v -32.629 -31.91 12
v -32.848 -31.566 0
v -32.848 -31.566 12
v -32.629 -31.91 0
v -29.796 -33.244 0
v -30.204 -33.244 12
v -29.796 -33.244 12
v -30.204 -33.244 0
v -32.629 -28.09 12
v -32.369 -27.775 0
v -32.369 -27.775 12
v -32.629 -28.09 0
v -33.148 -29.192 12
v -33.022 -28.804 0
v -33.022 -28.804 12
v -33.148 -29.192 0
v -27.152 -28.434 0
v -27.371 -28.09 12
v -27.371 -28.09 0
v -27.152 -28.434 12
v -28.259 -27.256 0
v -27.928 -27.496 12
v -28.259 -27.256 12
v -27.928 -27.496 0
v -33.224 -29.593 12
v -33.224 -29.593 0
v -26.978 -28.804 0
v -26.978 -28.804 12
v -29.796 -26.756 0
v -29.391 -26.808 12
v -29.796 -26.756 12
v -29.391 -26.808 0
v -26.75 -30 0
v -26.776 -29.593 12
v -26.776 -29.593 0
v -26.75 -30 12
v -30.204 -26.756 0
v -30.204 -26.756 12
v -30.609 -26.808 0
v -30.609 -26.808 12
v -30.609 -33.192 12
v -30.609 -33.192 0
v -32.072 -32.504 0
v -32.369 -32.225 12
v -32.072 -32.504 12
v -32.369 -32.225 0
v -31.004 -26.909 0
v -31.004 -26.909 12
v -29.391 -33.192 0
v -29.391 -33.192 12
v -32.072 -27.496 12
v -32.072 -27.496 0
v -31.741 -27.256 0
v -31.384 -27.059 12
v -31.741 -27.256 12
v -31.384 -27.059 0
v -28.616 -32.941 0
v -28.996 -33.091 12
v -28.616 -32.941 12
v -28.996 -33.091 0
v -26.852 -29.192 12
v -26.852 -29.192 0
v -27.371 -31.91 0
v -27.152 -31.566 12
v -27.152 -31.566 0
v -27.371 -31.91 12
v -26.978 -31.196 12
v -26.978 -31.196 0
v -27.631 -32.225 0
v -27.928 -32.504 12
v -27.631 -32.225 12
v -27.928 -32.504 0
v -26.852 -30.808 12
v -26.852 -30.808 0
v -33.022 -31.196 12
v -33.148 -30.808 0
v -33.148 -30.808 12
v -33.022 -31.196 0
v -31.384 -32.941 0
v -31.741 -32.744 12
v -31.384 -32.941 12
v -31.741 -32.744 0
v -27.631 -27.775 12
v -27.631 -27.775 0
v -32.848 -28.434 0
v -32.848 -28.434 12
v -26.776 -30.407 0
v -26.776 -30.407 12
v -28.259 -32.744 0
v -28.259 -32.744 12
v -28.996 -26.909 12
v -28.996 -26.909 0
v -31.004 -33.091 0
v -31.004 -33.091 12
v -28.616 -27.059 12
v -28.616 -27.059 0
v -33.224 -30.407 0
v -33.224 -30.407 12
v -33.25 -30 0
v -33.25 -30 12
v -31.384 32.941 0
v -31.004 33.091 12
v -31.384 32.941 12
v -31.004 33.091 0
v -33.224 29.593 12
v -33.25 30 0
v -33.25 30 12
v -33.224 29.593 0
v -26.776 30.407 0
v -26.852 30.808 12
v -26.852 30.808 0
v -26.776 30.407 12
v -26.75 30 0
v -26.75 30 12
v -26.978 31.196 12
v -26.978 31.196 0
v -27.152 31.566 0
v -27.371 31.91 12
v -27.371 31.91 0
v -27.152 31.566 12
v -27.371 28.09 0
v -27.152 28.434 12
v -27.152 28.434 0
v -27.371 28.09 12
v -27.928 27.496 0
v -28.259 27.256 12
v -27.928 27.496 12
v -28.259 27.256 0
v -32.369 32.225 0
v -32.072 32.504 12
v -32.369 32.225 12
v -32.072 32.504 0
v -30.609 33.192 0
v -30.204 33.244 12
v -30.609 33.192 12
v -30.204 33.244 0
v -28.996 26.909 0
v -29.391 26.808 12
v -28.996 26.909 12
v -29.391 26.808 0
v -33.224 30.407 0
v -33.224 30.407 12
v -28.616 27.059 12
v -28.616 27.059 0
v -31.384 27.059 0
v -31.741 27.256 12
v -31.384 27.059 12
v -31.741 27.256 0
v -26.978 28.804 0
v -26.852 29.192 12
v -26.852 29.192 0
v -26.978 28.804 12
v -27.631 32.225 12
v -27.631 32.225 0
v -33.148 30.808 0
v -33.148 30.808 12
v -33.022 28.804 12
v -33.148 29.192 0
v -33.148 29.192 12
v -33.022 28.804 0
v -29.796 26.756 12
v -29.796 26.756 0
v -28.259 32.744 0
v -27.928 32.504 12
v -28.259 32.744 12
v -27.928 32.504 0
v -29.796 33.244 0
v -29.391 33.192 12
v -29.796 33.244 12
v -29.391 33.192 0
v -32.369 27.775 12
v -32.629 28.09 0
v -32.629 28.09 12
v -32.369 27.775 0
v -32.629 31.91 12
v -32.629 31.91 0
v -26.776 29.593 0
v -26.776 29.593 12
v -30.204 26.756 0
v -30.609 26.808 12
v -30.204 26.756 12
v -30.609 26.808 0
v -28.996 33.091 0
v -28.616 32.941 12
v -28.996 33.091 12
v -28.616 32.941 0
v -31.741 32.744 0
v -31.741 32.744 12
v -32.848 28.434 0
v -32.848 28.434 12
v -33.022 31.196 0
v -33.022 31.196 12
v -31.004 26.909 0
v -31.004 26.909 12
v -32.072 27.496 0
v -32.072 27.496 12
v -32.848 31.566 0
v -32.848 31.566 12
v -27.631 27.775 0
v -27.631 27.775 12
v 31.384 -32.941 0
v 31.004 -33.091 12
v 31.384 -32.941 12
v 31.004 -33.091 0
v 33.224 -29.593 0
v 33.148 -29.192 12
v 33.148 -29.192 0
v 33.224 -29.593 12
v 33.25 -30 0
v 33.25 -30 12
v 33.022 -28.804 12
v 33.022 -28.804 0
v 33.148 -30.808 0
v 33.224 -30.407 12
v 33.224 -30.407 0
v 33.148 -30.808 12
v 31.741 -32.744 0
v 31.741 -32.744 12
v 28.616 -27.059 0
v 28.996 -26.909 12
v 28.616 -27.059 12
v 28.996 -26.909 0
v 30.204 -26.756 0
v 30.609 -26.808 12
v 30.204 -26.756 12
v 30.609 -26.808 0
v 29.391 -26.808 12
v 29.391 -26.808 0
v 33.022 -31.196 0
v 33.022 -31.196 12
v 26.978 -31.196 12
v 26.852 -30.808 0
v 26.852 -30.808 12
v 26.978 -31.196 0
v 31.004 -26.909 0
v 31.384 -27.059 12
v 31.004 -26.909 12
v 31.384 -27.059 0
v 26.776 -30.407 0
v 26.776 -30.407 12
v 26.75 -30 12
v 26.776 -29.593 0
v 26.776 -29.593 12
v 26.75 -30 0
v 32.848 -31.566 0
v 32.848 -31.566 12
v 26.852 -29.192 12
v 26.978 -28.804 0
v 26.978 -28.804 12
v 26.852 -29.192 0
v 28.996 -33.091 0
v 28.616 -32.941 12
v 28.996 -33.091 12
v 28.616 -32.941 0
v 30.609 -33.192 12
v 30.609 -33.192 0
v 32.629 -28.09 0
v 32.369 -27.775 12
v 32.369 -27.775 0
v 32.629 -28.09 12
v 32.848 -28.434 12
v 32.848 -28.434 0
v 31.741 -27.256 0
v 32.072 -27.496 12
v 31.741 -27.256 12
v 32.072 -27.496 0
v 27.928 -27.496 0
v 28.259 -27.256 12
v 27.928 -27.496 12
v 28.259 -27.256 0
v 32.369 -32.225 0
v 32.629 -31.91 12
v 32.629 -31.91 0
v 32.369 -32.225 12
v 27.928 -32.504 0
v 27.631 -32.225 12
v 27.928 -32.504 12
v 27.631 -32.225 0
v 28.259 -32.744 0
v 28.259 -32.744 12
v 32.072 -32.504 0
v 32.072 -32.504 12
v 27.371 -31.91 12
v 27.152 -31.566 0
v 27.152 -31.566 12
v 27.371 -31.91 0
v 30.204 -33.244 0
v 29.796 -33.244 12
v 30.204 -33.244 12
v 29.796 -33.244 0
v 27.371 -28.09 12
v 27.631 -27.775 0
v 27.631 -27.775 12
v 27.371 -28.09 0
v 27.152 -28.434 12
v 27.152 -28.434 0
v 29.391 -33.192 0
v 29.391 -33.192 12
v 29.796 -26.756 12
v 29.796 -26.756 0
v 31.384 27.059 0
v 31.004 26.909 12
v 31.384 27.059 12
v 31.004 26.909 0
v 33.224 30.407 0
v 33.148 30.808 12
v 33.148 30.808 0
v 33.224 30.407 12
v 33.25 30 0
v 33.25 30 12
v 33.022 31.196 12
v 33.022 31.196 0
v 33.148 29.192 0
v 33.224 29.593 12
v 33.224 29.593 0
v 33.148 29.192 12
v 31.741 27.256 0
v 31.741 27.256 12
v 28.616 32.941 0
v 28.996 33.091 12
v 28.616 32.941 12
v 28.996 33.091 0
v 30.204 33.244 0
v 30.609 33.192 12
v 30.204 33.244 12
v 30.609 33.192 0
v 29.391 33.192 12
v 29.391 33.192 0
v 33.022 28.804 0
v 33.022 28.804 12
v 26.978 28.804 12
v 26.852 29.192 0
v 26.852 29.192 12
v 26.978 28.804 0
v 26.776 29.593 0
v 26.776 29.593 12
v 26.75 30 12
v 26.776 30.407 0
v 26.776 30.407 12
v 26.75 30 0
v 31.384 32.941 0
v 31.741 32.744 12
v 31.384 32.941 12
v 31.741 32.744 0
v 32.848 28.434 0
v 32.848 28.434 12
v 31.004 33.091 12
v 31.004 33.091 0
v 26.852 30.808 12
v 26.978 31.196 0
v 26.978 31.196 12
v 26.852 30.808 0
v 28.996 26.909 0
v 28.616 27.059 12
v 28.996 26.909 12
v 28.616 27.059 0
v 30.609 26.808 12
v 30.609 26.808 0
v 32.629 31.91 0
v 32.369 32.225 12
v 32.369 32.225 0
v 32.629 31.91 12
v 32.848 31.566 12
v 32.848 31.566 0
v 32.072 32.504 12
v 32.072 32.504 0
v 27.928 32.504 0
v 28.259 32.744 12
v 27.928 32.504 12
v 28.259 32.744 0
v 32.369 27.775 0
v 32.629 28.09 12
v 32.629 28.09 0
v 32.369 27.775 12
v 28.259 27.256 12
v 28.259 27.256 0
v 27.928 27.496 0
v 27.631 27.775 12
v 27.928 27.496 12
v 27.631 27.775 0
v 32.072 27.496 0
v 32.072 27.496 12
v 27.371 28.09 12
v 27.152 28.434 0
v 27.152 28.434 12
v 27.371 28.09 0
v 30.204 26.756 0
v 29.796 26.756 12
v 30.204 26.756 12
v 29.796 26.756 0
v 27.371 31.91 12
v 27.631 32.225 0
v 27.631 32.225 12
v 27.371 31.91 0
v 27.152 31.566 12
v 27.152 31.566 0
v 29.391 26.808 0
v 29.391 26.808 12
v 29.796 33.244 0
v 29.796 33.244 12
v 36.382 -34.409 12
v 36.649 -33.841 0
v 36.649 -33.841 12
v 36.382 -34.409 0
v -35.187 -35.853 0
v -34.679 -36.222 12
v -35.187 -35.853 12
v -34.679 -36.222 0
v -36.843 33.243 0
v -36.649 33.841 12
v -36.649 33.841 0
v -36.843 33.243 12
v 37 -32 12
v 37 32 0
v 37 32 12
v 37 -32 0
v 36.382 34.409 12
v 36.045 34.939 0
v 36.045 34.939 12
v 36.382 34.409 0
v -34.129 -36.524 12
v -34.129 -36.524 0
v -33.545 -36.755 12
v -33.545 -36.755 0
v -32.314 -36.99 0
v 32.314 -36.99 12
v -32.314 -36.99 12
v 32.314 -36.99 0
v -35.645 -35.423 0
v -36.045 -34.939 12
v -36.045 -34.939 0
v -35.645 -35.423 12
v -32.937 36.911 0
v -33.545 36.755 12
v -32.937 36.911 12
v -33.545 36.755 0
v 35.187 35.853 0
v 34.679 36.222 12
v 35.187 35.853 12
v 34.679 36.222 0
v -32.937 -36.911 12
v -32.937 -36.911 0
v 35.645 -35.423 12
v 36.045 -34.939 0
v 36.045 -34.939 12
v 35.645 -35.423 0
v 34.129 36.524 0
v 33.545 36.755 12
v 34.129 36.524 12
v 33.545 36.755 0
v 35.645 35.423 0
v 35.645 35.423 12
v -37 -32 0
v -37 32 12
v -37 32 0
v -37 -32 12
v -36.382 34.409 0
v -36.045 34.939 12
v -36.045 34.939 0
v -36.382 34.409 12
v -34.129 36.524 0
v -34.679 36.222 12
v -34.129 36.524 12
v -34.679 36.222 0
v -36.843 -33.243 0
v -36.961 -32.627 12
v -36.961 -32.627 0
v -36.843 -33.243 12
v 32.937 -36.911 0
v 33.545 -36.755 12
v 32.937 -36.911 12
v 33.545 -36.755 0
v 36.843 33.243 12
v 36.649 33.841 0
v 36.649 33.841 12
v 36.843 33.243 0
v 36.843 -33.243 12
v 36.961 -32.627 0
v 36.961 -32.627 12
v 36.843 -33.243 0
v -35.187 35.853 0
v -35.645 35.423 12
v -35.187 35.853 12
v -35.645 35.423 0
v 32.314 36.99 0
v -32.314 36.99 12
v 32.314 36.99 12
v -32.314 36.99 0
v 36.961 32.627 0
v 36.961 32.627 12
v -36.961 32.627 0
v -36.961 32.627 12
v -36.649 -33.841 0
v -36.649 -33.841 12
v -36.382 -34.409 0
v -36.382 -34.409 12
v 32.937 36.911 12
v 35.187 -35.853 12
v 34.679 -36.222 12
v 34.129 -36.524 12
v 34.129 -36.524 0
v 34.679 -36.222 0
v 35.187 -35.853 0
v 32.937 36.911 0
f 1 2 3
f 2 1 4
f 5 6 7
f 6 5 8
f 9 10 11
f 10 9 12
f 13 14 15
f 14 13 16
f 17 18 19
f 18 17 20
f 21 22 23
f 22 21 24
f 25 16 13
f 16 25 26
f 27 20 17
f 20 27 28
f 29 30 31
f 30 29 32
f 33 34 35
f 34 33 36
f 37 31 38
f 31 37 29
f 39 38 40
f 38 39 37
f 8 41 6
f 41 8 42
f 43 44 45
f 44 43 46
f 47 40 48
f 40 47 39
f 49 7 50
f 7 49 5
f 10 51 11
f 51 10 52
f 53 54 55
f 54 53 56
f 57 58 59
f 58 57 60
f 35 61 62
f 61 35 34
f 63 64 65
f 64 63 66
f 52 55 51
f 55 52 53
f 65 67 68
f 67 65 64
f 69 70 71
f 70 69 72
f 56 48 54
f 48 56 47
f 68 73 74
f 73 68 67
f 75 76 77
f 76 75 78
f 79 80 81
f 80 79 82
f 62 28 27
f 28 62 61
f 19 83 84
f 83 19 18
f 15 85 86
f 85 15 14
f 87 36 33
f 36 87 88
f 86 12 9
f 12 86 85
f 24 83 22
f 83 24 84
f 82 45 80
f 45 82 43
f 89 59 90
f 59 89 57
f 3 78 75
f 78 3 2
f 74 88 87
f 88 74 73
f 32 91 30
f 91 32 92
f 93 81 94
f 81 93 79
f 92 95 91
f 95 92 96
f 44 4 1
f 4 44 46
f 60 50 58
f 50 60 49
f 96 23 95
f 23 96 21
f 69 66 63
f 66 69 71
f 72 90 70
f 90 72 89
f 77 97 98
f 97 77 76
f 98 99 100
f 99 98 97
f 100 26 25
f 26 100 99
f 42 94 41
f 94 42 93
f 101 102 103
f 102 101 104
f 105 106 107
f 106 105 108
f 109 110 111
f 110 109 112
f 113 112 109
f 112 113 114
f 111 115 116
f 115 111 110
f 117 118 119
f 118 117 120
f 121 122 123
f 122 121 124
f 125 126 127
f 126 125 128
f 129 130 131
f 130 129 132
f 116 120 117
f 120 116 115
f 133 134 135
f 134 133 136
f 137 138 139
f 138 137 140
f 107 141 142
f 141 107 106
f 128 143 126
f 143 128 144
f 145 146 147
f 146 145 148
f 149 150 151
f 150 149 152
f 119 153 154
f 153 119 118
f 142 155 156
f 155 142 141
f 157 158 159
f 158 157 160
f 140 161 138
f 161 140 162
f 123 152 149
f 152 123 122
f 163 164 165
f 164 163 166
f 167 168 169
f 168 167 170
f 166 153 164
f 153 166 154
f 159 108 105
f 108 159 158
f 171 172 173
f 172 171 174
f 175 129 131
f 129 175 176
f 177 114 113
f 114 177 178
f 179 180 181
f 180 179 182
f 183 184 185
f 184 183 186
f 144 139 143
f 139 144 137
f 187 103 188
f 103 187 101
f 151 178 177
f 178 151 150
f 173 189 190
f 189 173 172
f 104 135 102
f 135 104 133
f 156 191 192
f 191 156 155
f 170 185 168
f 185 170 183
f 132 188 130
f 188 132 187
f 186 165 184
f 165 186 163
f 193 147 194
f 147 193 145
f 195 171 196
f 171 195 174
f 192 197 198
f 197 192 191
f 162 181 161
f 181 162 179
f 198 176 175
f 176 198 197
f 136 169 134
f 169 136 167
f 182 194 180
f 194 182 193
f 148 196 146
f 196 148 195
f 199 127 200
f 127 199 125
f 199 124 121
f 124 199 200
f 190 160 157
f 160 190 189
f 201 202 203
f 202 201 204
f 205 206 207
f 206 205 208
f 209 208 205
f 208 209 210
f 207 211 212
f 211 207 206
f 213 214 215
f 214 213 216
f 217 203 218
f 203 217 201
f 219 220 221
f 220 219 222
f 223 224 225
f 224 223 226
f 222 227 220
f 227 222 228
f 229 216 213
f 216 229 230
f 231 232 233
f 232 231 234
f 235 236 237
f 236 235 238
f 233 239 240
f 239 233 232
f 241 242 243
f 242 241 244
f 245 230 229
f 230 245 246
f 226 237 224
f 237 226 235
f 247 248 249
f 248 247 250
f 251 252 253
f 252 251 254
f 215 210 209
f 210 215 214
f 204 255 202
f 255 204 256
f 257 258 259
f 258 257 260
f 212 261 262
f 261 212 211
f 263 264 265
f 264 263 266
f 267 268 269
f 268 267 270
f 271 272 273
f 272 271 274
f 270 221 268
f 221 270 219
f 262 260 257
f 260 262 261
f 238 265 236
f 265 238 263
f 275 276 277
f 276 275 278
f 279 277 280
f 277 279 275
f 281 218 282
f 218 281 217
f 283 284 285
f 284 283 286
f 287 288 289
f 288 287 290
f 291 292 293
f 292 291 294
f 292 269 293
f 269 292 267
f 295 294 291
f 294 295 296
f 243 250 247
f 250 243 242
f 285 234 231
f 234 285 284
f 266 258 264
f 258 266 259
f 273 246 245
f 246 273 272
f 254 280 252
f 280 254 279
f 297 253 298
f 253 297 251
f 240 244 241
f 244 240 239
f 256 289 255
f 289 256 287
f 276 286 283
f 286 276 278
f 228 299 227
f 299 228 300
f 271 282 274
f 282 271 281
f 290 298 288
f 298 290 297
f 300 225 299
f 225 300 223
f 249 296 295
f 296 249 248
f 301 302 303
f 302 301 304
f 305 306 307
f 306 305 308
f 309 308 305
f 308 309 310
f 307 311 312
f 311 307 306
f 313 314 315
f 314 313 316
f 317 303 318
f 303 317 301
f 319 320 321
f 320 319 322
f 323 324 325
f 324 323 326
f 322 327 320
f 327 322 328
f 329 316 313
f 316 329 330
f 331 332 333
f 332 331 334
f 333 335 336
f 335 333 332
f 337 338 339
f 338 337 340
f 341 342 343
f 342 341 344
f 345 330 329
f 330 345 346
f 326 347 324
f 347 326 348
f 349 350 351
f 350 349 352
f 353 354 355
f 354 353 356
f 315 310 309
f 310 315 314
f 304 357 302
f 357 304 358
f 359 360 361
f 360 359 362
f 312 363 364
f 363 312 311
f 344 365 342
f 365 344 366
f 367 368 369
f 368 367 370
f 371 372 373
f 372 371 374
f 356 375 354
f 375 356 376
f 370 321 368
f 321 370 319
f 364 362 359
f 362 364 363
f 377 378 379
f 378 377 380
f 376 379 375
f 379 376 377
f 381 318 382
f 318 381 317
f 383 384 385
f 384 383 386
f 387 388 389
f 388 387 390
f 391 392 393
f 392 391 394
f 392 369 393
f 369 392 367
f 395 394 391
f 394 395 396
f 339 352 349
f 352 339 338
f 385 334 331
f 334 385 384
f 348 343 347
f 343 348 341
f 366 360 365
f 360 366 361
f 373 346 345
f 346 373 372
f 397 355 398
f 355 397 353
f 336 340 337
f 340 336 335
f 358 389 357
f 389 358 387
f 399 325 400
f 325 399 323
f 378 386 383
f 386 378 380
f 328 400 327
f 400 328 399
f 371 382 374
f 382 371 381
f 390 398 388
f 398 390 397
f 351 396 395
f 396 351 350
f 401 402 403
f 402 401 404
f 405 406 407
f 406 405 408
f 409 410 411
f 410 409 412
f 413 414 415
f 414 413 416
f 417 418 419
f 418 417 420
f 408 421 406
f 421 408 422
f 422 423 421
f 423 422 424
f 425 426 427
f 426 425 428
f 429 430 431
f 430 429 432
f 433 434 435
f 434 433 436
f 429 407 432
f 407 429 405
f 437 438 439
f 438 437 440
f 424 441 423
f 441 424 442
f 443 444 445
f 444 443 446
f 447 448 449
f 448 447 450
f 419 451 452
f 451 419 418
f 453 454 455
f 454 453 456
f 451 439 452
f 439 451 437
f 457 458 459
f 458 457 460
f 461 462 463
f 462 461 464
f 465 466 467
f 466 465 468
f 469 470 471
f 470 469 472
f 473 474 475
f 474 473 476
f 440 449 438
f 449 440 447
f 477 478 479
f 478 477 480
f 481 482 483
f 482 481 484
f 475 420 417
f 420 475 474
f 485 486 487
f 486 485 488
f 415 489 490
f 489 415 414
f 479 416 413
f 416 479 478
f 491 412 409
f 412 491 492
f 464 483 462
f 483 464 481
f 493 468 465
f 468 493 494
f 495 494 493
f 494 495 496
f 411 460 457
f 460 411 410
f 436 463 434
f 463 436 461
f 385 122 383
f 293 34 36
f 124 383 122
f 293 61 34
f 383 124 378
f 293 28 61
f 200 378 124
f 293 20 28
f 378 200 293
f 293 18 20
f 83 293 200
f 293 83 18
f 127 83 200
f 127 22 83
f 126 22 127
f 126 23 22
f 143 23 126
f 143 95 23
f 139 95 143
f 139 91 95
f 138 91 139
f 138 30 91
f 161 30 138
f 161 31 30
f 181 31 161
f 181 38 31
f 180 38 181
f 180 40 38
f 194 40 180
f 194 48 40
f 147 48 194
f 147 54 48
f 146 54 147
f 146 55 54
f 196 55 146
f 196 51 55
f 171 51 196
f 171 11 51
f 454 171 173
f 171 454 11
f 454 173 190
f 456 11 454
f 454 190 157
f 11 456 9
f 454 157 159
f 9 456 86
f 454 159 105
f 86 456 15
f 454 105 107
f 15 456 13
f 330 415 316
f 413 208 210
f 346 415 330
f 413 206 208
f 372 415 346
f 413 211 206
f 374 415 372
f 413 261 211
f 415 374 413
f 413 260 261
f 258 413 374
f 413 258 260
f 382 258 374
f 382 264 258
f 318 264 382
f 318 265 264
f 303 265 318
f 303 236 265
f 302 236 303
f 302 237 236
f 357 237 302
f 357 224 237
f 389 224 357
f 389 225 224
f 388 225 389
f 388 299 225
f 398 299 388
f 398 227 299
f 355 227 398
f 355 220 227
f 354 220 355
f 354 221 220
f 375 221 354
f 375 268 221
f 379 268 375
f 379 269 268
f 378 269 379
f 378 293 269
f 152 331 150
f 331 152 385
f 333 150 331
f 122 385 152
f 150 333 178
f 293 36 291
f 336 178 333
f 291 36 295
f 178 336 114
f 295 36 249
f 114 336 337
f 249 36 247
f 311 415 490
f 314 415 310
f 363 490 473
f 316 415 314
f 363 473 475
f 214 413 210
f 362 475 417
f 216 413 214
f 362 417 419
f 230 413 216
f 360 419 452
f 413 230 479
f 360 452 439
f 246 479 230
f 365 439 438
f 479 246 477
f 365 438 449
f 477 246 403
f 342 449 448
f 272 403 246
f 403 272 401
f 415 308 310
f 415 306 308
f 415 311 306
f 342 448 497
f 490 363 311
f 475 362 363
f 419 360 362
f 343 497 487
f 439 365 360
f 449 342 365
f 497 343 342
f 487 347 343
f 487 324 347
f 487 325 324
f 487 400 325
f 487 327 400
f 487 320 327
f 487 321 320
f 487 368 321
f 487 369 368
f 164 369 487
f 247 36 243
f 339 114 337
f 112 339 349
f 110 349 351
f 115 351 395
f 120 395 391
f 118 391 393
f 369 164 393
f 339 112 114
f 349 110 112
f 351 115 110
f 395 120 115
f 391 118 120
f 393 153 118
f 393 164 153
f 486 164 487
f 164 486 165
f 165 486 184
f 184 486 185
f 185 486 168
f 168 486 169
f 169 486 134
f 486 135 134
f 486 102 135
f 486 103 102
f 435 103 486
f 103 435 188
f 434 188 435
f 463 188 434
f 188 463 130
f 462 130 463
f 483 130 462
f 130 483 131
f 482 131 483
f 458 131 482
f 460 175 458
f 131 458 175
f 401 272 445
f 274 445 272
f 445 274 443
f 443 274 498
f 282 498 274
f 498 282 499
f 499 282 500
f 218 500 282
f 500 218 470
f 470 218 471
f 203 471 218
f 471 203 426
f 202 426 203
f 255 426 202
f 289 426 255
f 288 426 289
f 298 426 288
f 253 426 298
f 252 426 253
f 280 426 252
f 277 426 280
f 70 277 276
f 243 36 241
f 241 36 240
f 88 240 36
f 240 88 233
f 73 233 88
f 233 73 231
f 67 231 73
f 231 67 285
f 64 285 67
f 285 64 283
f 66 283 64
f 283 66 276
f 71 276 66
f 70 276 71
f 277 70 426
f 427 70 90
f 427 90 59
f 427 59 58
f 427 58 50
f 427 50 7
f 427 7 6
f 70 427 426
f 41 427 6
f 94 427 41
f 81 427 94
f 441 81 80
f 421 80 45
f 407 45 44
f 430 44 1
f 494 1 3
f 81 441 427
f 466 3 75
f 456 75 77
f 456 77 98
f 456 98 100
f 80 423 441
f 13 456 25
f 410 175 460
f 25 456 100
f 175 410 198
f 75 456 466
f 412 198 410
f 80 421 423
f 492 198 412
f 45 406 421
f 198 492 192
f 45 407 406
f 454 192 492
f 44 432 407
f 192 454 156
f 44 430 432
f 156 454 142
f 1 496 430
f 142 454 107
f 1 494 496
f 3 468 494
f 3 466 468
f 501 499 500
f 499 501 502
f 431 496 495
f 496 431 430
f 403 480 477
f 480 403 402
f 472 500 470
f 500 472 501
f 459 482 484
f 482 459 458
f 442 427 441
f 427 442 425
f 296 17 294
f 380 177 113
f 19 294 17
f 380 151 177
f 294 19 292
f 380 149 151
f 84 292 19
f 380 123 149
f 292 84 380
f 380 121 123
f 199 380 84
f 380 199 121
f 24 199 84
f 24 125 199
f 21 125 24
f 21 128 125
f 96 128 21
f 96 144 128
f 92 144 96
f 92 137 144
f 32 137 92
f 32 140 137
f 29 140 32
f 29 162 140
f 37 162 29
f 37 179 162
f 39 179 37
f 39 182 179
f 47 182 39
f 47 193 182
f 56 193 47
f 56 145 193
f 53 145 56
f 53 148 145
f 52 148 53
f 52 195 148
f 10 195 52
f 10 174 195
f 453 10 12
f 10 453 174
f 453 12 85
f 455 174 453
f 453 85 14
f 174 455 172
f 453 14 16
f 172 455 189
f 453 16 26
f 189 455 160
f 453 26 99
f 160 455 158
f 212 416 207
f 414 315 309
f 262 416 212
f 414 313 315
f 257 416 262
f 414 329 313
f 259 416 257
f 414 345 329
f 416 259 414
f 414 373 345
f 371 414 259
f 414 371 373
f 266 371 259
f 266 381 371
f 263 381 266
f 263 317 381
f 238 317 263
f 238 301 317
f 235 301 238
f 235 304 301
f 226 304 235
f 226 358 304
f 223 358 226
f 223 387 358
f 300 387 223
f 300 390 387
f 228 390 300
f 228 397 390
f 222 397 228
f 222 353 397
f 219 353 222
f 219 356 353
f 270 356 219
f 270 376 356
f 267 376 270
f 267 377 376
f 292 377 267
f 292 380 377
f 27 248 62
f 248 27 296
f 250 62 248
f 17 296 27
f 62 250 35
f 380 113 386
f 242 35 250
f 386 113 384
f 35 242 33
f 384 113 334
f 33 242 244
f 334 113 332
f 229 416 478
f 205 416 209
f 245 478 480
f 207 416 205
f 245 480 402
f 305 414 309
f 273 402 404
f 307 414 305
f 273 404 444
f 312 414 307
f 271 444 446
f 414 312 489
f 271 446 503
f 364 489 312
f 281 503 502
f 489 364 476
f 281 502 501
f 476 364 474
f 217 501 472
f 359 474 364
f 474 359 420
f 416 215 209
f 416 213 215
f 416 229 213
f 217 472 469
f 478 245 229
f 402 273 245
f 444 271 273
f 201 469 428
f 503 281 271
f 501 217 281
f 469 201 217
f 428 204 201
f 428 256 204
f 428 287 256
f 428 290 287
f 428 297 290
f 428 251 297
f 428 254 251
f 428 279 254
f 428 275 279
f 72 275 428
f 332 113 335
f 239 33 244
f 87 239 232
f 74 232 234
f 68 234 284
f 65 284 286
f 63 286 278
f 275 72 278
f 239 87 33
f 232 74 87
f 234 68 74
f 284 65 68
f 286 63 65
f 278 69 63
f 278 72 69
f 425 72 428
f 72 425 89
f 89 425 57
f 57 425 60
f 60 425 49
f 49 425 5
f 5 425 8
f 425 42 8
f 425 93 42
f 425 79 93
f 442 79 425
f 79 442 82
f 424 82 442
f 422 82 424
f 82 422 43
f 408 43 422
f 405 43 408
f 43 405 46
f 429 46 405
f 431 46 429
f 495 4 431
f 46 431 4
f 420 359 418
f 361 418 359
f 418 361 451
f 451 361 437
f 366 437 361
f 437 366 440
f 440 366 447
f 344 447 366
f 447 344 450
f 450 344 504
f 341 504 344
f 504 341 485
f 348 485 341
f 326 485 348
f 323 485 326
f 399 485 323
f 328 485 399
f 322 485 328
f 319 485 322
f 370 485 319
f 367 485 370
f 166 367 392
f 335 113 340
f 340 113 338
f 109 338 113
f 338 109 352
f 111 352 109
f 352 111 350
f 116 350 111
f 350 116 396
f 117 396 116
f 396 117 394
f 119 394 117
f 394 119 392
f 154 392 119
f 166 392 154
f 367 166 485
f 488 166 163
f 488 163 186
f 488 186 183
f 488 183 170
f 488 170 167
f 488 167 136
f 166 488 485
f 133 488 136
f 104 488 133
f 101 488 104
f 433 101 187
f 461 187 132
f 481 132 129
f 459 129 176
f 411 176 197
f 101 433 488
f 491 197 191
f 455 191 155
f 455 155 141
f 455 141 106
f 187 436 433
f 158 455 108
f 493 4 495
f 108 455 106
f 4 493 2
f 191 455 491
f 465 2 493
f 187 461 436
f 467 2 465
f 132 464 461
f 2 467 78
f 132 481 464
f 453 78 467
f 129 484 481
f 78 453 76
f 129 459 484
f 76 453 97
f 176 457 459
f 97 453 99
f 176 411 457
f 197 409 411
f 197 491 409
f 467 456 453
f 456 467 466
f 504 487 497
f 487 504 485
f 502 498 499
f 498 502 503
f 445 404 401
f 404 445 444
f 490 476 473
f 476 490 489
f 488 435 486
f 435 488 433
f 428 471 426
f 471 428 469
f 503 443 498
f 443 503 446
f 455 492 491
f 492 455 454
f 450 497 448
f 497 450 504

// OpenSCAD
$fn = 50;


difference() {
	union() {
		hull() {
			translate(v = [-32.0000000000, 32.0000000000, 0]) {
				cylinder(h = 12, r = 5);
			}
			translate(v = [32.0000000000, 32.0000000000, 0]) {
				cylinder(h = 12, r = 5);
			}
			translate(v = [-32.0000000000, -32.0000000000, 0]) {
				cylinder(h = 12, r = 5);
			}
			translate(v = [32.0000000000, -32.0000000000, 0]) {
				cylinder(h = 12, r = 5);
			}
		}
	}
	union() {
		translate(v = [-30.0000000000, -30.0000000000, -100.0000000000]) {
			cylinder(h = 200, r = 3.2500000000);
		}
		translate(v = [-30.0000000000, 30.0000000000, -100.0000000000]) {
			cylinder(h = 200, r = 3.2500000000);
		}
		translate(v = [30.0000000000, -30.0000000000, -100.0000000000]) {
			cylinder(h = 200, r = 3.2500000000);
		}
		translate(v = [30.0000000000, 30.0000000000, -100.0000000000]) {
			cylinder(h = 200, r = 3.2500000000);
		}
	}
}
